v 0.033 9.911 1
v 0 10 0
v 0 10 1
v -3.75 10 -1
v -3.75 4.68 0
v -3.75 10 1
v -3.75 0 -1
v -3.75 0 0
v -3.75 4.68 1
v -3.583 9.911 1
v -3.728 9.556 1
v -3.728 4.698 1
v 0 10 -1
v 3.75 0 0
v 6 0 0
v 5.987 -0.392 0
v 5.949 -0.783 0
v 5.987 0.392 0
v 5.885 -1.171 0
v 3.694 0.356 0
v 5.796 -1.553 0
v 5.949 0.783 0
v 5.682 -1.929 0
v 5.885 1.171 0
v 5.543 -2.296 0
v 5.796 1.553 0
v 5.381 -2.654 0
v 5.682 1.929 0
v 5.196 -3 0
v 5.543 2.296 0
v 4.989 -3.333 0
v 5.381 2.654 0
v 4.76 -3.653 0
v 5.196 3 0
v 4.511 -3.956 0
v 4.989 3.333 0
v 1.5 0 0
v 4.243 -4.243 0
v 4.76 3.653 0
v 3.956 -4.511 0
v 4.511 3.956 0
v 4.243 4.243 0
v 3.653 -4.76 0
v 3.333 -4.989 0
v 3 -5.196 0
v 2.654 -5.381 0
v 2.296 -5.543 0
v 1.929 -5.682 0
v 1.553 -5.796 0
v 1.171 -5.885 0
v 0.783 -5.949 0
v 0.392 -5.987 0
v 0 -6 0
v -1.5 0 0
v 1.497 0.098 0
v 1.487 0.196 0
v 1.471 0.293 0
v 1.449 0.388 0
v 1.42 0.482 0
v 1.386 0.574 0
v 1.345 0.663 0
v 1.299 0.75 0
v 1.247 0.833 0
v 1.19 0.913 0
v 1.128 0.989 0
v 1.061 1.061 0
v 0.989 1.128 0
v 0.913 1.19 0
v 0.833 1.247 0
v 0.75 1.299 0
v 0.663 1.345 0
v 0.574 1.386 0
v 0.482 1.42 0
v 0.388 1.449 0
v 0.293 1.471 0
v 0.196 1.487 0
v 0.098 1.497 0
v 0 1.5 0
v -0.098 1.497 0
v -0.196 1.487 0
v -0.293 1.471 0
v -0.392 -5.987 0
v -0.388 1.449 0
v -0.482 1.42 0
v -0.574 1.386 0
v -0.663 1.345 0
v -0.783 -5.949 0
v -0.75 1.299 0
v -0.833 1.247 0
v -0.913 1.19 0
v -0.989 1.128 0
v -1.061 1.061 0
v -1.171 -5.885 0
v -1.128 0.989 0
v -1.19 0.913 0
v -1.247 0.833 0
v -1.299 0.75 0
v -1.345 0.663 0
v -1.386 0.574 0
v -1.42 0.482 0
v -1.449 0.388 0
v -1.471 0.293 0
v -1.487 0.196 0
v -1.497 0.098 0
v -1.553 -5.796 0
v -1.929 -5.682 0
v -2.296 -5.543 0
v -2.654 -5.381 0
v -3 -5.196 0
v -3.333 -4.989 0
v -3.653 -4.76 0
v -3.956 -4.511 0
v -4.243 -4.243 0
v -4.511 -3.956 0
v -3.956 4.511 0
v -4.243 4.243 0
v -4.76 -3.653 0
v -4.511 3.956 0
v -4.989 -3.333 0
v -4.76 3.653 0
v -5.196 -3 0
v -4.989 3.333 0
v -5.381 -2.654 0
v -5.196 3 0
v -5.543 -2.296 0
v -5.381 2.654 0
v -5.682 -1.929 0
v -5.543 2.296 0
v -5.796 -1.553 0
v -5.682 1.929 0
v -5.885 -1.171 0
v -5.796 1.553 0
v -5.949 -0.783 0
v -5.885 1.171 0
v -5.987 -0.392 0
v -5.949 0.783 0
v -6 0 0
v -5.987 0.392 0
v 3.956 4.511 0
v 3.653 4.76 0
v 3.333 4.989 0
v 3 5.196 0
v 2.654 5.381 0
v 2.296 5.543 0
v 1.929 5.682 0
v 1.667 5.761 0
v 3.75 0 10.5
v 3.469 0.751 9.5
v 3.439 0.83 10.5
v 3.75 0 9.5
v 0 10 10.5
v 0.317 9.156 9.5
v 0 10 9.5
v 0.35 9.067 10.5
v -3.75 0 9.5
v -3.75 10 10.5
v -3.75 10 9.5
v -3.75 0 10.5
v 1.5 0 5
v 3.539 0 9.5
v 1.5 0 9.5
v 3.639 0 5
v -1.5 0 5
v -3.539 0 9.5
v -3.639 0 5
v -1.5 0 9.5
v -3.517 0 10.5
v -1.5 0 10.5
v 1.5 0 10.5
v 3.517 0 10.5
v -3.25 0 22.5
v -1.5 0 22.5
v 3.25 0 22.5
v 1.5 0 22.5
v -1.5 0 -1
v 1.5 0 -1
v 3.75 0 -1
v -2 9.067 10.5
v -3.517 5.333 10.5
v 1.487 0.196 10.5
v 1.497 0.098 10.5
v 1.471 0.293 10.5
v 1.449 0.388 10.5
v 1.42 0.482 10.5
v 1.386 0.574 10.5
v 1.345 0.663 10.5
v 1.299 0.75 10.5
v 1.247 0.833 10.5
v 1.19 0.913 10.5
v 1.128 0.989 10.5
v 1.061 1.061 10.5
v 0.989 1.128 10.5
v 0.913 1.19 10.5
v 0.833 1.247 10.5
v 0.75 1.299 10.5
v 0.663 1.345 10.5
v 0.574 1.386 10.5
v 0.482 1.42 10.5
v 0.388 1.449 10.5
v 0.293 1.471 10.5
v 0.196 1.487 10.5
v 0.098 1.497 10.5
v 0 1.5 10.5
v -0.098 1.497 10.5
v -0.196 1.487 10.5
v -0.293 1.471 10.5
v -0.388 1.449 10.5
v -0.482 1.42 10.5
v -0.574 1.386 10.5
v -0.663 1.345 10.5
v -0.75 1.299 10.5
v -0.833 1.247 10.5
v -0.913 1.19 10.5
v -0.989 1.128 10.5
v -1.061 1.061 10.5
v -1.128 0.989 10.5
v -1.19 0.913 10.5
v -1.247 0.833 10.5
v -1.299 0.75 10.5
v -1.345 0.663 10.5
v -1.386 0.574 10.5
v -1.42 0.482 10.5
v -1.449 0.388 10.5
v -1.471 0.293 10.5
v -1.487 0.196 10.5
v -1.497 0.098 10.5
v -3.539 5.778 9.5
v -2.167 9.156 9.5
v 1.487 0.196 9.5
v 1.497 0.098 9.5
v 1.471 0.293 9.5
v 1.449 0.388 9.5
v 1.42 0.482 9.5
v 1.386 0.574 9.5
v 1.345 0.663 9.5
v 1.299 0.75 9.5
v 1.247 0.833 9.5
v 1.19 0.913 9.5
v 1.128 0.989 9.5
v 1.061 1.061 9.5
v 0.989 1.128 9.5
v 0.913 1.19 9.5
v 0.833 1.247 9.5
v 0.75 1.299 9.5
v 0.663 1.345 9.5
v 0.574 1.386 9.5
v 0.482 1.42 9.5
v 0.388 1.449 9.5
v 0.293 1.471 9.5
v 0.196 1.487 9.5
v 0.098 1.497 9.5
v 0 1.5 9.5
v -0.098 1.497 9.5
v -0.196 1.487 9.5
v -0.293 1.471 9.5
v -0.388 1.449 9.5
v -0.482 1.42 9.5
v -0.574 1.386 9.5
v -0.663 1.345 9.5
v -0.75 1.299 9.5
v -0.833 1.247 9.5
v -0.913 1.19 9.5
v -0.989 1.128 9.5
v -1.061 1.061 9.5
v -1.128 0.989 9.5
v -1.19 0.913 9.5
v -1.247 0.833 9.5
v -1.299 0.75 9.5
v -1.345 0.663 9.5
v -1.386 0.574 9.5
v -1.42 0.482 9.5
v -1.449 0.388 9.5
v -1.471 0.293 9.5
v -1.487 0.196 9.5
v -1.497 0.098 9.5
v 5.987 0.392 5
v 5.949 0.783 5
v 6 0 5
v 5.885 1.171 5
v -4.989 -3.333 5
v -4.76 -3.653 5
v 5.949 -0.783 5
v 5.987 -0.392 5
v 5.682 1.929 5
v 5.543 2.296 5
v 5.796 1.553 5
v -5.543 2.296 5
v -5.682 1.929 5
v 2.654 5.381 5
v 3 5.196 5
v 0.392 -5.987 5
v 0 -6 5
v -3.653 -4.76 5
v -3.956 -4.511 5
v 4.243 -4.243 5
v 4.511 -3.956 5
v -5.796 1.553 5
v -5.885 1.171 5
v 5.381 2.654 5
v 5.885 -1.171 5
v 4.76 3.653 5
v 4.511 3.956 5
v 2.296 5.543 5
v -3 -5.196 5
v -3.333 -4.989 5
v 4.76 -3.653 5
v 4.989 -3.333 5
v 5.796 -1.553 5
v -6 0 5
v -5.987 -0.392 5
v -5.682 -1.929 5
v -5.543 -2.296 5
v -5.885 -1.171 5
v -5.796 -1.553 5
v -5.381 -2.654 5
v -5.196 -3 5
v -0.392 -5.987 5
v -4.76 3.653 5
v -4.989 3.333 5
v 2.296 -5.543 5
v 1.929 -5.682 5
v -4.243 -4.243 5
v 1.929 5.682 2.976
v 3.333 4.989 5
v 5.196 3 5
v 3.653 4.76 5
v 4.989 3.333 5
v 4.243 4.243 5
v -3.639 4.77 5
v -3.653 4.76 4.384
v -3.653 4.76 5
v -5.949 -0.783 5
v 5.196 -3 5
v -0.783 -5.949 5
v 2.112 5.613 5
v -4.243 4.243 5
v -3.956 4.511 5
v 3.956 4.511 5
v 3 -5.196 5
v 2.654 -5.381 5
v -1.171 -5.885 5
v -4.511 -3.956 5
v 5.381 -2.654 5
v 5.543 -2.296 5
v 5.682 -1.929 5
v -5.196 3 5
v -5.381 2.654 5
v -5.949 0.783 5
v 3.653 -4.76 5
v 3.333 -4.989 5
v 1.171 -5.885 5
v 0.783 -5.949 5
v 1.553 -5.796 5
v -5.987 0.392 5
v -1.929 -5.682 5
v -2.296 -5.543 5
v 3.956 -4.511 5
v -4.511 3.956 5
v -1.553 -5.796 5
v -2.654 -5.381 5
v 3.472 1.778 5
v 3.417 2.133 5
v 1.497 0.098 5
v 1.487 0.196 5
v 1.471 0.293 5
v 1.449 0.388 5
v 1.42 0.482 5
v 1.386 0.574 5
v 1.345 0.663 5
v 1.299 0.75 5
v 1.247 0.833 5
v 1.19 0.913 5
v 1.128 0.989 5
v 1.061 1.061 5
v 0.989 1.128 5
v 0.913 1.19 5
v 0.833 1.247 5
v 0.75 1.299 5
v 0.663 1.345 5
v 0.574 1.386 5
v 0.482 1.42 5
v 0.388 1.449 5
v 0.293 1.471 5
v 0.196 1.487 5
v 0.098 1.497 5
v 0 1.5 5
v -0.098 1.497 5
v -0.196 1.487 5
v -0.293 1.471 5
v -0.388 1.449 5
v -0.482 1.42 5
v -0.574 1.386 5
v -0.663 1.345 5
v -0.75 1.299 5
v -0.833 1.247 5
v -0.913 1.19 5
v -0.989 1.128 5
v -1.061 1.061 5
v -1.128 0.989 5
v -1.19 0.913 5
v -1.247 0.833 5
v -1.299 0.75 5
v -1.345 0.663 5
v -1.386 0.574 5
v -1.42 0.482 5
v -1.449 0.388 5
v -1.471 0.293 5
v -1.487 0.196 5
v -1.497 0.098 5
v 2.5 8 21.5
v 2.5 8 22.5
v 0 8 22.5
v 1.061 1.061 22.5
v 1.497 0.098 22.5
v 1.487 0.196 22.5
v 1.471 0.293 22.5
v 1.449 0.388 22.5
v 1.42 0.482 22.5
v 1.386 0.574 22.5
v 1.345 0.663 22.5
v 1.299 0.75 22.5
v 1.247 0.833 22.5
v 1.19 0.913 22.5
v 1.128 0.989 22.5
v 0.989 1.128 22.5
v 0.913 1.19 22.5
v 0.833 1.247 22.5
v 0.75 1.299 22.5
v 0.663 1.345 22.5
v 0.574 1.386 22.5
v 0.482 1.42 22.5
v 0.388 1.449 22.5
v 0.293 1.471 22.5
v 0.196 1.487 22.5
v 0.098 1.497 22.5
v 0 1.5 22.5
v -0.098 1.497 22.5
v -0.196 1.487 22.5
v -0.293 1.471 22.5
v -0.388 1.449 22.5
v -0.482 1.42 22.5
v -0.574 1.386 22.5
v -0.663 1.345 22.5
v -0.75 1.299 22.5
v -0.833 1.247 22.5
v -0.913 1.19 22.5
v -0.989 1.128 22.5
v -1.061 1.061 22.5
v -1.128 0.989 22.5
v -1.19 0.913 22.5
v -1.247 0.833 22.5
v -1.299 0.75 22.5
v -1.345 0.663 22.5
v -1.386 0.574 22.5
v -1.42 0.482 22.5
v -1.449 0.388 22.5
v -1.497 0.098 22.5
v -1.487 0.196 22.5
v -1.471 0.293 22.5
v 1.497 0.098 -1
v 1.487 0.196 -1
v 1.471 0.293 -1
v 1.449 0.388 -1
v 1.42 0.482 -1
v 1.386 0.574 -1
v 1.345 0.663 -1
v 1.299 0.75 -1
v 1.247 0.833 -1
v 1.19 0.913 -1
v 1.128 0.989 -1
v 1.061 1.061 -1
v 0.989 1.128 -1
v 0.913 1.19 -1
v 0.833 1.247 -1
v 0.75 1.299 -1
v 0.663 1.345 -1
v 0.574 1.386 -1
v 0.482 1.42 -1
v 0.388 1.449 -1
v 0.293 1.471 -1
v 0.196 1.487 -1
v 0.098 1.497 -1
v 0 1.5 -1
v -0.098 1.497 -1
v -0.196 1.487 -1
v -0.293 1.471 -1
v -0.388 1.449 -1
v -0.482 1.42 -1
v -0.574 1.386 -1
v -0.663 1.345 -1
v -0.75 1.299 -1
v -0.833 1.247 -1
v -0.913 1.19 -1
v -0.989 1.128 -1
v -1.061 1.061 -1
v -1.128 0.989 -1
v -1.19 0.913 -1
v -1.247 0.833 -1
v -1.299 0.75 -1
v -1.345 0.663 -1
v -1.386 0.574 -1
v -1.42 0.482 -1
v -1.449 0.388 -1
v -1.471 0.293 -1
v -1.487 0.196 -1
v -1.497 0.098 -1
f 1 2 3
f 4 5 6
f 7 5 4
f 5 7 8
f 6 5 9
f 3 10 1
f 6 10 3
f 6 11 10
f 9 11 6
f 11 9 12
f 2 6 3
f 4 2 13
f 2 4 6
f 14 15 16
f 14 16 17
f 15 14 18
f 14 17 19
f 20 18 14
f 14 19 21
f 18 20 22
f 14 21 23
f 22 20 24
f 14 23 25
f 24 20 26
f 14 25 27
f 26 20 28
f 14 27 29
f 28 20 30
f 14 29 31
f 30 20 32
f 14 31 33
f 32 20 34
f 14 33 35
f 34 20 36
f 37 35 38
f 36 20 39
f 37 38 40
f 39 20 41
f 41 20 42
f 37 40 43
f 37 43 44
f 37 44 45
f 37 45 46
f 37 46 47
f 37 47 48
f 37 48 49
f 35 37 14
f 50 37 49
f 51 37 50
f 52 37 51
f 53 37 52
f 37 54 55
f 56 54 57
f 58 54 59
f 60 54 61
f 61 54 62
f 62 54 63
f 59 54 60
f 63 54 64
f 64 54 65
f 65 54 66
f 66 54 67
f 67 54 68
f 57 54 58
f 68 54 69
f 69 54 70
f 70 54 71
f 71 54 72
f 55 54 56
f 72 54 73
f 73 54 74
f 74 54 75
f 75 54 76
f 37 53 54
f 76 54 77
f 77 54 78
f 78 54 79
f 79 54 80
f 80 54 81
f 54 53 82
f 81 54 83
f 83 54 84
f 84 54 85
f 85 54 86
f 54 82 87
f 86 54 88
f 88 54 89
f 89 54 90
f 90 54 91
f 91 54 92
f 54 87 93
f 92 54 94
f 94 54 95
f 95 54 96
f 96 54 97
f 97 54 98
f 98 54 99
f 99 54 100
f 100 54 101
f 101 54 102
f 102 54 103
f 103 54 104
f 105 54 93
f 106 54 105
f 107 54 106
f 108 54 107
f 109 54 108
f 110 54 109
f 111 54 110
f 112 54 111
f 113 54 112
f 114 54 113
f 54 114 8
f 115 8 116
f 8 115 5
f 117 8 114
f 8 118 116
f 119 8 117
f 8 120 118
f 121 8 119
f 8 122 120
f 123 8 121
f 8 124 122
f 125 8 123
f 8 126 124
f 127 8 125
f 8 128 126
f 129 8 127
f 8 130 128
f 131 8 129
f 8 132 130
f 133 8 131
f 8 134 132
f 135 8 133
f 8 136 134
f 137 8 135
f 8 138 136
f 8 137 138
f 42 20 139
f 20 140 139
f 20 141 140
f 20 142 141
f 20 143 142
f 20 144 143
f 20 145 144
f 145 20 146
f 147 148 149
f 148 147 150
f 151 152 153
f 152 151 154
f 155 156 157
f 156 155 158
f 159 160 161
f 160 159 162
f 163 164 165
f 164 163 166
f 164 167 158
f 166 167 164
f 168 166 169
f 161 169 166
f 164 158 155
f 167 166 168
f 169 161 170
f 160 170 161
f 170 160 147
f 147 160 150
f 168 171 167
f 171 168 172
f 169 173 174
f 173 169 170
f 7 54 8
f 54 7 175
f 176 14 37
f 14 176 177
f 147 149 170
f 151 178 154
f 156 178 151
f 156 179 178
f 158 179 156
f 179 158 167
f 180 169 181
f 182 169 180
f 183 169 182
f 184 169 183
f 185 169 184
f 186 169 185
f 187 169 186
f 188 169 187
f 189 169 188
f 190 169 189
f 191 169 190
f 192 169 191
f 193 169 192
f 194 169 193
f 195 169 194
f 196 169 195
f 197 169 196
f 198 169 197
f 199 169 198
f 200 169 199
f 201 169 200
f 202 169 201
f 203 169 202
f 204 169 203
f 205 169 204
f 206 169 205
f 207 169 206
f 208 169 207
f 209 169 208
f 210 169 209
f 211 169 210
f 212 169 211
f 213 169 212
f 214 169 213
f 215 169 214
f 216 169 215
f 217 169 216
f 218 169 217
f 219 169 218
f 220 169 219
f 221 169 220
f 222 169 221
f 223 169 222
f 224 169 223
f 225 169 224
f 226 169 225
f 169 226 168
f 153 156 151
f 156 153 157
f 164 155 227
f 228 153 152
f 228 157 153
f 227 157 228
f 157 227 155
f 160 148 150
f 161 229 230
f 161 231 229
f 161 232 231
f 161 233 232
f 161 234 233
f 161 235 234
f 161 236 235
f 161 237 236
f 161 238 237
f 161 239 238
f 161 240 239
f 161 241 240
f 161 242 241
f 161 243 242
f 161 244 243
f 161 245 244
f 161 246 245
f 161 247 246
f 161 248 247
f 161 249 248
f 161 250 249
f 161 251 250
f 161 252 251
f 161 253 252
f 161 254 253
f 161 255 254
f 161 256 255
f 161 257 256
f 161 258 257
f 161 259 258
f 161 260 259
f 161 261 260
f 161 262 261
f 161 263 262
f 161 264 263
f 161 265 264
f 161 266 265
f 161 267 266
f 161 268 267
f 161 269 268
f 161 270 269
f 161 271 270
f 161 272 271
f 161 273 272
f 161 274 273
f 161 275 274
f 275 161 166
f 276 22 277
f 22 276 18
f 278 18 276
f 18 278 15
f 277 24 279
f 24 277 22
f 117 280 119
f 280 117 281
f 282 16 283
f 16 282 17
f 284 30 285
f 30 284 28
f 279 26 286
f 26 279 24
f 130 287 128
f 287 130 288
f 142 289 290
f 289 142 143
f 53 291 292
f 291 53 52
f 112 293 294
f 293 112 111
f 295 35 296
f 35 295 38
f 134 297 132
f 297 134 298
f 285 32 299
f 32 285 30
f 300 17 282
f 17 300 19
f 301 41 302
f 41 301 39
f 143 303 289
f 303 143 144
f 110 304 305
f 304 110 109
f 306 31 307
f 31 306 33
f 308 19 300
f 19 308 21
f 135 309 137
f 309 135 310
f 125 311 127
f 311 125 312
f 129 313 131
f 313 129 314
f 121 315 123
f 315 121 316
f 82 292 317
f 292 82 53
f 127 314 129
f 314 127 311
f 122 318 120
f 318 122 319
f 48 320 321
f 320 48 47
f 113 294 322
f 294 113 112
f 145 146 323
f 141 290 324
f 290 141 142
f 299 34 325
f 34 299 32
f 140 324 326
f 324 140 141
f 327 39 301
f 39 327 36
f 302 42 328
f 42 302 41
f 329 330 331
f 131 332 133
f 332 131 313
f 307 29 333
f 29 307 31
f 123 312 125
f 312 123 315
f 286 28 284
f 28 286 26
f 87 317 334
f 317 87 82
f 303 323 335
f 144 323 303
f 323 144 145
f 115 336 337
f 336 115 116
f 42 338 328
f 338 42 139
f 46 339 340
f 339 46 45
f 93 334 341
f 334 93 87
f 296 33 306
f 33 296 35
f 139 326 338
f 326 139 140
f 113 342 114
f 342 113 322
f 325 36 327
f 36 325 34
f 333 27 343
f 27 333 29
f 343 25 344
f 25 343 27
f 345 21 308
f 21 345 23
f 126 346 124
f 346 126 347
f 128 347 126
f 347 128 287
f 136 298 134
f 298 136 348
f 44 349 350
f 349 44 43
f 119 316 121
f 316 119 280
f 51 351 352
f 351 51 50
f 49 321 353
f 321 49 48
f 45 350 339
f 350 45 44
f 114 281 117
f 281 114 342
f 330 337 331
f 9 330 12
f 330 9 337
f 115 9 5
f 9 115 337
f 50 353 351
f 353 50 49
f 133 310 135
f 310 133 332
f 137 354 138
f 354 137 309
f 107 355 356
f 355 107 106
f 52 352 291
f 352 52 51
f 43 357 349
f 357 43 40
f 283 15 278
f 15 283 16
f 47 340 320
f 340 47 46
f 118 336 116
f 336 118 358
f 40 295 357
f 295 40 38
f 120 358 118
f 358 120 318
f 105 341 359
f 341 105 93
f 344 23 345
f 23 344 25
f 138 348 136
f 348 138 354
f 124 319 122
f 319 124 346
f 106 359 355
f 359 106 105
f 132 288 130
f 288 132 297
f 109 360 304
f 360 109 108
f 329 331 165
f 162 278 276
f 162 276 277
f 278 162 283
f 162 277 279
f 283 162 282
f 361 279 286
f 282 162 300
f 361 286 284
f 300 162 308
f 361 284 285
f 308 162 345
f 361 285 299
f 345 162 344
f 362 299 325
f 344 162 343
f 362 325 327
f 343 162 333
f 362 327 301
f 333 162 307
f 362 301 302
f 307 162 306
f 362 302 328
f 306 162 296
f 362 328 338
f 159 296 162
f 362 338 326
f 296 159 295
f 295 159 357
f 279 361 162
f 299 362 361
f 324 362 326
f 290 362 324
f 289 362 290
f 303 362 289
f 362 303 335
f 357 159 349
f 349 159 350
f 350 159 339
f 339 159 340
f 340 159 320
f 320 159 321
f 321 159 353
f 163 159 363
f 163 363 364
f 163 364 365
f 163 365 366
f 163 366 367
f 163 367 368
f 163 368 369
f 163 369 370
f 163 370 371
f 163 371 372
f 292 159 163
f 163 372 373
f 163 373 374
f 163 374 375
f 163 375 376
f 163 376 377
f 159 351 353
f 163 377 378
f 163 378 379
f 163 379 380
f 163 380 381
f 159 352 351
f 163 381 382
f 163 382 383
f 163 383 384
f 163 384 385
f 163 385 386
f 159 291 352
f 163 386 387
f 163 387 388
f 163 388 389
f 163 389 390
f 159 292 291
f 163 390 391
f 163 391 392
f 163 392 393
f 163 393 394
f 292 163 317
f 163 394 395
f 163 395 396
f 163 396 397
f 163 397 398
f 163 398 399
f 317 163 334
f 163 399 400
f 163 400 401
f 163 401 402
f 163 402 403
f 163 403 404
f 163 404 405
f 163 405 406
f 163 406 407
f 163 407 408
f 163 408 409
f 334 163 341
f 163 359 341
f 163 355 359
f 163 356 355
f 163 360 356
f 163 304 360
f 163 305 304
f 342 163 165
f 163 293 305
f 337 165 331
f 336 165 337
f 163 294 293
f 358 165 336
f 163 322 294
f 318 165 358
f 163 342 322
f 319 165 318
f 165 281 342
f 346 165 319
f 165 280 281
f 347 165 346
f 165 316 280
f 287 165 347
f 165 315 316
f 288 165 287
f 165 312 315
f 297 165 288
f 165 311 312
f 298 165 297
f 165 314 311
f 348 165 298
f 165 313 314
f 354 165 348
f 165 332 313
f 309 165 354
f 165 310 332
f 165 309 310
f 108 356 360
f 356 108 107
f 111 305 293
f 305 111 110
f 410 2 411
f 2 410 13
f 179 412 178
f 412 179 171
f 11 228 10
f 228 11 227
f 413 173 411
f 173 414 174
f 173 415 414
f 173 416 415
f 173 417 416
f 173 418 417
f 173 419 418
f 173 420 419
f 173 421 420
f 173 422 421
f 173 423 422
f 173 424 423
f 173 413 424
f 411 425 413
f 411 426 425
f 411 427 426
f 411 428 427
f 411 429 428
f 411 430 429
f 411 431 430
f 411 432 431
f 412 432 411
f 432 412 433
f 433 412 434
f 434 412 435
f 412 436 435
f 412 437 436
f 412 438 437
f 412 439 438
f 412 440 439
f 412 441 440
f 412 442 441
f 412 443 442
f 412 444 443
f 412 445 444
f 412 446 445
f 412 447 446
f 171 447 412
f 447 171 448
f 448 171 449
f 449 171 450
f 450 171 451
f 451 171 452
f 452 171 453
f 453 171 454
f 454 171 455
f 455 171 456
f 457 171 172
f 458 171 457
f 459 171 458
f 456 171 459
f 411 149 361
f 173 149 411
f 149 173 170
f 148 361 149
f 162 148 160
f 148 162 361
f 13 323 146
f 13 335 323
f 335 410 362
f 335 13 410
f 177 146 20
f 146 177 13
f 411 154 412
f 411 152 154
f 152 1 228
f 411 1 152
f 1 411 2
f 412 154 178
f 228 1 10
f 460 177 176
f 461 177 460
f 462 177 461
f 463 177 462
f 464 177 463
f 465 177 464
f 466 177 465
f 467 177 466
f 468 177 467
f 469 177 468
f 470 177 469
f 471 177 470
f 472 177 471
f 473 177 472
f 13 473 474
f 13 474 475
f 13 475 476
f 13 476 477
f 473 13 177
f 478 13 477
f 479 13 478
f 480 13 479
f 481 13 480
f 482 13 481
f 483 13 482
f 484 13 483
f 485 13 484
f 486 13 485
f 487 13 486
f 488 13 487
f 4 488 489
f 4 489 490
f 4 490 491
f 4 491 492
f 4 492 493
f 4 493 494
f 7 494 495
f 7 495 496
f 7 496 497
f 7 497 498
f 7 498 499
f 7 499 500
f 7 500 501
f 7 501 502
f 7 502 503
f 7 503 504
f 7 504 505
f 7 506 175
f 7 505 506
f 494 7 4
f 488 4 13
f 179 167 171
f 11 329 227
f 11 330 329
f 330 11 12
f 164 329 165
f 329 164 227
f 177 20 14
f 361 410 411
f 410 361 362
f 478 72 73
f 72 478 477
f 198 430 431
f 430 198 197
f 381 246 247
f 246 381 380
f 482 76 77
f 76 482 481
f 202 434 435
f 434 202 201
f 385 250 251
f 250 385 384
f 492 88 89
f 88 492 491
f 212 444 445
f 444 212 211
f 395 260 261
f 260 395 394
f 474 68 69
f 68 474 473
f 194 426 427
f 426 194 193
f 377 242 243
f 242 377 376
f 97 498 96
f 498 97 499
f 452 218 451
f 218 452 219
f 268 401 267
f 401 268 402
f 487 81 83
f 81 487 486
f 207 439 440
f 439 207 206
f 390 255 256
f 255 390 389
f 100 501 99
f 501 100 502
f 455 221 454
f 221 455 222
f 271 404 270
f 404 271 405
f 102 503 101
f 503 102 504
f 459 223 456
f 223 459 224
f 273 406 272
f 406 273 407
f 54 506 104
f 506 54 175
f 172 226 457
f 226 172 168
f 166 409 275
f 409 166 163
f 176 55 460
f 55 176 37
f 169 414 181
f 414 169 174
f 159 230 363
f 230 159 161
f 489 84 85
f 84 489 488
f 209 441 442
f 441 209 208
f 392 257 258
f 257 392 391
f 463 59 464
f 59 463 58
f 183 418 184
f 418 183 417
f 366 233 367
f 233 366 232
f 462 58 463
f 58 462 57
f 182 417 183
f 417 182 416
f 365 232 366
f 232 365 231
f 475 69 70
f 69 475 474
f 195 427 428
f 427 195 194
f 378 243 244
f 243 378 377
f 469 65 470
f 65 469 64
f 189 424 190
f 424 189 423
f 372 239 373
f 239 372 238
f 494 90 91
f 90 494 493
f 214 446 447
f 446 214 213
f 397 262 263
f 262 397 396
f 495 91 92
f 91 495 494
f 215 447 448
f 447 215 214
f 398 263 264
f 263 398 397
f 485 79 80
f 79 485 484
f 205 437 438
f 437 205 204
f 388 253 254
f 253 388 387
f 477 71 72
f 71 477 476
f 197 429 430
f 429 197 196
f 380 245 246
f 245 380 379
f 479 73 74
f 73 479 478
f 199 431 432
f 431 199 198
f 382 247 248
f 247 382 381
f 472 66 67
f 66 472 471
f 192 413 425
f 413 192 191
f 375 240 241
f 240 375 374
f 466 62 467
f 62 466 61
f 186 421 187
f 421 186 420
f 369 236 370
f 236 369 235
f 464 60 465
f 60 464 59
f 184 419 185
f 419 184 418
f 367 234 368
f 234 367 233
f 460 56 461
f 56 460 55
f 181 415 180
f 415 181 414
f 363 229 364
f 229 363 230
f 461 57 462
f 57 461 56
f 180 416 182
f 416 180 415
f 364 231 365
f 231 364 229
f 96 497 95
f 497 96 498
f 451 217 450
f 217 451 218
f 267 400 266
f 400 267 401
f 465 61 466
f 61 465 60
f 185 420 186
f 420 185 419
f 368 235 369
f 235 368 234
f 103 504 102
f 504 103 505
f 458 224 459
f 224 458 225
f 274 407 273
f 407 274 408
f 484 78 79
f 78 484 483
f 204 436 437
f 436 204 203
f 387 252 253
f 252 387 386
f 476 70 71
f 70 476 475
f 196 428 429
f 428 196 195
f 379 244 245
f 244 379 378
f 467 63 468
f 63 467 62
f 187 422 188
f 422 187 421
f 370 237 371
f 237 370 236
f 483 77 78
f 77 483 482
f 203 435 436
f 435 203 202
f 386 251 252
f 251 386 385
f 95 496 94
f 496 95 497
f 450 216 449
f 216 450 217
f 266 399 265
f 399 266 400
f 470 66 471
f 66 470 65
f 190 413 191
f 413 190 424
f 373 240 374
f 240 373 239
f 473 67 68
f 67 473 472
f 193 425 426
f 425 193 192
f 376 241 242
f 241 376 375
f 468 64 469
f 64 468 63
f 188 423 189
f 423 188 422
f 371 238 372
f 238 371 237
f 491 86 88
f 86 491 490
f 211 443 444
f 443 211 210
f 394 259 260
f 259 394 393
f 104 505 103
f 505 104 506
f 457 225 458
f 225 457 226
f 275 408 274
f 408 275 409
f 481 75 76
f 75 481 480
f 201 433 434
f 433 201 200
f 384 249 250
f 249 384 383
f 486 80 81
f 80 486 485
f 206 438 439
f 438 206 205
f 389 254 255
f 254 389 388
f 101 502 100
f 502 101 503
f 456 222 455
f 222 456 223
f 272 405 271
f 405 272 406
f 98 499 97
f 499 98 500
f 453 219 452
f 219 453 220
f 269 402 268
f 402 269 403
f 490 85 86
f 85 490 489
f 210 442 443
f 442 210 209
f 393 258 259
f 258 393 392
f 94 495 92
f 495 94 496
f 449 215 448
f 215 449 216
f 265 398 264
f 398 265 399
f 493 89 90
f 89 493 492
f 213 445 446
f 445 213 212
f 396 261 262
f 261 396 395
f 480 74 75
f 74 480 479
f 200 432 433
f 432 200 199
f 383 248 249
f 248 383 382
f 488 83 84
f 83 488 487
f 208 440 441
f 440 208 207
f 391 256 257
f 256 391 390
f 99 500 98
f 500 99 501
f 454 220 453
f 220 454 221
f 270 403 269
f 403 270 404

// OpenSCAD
// Straight hose-barb reducer: 8 mm ID tubing to 5 mm ID tubing
// Print orientation: standing upright along Z axis

$fn = 96;

// ---- Dimensions (mm) ----
barb8_od_bottom = 7.5;   // 8 mm tubing barb: OD at bottom
barb8_od_top    = 9.5;   // 8 mm tubing barb: OD at top
barb8_height    = 10;    // 8 mm tubing barb: height
barb5_od_bottom = 6.5;   // 5 mm tubing barb: OD at bottom
barb5_od_top    = 5.0;   // 5 mm tubing barb: OD at top
barb5_height    = 8;     // 5 mm tubing barb: height
collar_d        = 12;    // cylindrical collar: diameter
collar_h        = 5;     // cylindrical collar: height
bore_d          = 3;     // through-bore diameter
overlap         = 0.5;   // overlap between stacked barbs for a clean union

total_length = barb8_height + collar_h + barb5_height;  // 23 mm overall

// ---- Model ----
union() {
    // 8 mm tubing barbs (sawtooth profile), stacked
    for (i = [0 : 1]) {
        translate([0, 0, i * barb8_height - (i > 0 ? overlap : 0)])
            linear_extrude(height = 1)
                polygon([
                    [-barb8_od_bottom / 2, 0],
                    [ barb8_od_bottom / 2, 0],
                    [ 0, barb8_height],
                    [ -barb8_od_bottom / 2, barb8_height]
                ]);
    }

    // Cylindrical collar
    translate([0, 0, barb8_height - overlap, 0])
        cylinder(d = collar_d, h = collar_h + (overlap < 0 ? -overlap : 0));

    // 5 mm tubing barbs (shrinking profile), stacked
    for (i = [0 : 1]) {
        translate([0, 0, i * barb5_height - (i > 0 ? overlap : 0)])
            linear_extrude(height = 1)
                polygon([
                    [-barb5_od_bottom / 2, 0],
                    [ barb5_od_bottom / 2, 0],
                    [ 0, barb5_height],
                    [ -barb5_od_top / 2, barb5_height],
                    [ barb5_od_top / 2, barb5_height]
                ]);
    }
}

// Through-bore, extending past both end faces
difference() {
    // (Current) bounding box of the part
    translate([0, 0, -1])
        hull() {
            // lower end
            translate([0, 0, 0])
                linear_extrude(height = 1)
                    polygon([
                        [-barb8_od_bottom / 2, 0],
                        [ barb8_od_bottom / 2, 0],
                        [ 0, barb8_height],
                        [ -barb8_od_bottom / 2, barb8_height]
                    ]);
            // upper end
            translate([0, 0, total_length - overlap])
                linear_extrude(height = 1)
                    polygon([
                        [-barb5_od_bottom / 2, 0],
                        [ barb5_od_bottom / 2, 0],
                        [ 0, barb5_height],
                        [ -barb5_od_top / 2, barb5_height],
                        [ barb5_od_top / 2, barb5_height]
                    ]);
        }
    // bore
    translate([0, 0, -1])
        cylinder(d = bore_d, h = total_length + 2);
}
